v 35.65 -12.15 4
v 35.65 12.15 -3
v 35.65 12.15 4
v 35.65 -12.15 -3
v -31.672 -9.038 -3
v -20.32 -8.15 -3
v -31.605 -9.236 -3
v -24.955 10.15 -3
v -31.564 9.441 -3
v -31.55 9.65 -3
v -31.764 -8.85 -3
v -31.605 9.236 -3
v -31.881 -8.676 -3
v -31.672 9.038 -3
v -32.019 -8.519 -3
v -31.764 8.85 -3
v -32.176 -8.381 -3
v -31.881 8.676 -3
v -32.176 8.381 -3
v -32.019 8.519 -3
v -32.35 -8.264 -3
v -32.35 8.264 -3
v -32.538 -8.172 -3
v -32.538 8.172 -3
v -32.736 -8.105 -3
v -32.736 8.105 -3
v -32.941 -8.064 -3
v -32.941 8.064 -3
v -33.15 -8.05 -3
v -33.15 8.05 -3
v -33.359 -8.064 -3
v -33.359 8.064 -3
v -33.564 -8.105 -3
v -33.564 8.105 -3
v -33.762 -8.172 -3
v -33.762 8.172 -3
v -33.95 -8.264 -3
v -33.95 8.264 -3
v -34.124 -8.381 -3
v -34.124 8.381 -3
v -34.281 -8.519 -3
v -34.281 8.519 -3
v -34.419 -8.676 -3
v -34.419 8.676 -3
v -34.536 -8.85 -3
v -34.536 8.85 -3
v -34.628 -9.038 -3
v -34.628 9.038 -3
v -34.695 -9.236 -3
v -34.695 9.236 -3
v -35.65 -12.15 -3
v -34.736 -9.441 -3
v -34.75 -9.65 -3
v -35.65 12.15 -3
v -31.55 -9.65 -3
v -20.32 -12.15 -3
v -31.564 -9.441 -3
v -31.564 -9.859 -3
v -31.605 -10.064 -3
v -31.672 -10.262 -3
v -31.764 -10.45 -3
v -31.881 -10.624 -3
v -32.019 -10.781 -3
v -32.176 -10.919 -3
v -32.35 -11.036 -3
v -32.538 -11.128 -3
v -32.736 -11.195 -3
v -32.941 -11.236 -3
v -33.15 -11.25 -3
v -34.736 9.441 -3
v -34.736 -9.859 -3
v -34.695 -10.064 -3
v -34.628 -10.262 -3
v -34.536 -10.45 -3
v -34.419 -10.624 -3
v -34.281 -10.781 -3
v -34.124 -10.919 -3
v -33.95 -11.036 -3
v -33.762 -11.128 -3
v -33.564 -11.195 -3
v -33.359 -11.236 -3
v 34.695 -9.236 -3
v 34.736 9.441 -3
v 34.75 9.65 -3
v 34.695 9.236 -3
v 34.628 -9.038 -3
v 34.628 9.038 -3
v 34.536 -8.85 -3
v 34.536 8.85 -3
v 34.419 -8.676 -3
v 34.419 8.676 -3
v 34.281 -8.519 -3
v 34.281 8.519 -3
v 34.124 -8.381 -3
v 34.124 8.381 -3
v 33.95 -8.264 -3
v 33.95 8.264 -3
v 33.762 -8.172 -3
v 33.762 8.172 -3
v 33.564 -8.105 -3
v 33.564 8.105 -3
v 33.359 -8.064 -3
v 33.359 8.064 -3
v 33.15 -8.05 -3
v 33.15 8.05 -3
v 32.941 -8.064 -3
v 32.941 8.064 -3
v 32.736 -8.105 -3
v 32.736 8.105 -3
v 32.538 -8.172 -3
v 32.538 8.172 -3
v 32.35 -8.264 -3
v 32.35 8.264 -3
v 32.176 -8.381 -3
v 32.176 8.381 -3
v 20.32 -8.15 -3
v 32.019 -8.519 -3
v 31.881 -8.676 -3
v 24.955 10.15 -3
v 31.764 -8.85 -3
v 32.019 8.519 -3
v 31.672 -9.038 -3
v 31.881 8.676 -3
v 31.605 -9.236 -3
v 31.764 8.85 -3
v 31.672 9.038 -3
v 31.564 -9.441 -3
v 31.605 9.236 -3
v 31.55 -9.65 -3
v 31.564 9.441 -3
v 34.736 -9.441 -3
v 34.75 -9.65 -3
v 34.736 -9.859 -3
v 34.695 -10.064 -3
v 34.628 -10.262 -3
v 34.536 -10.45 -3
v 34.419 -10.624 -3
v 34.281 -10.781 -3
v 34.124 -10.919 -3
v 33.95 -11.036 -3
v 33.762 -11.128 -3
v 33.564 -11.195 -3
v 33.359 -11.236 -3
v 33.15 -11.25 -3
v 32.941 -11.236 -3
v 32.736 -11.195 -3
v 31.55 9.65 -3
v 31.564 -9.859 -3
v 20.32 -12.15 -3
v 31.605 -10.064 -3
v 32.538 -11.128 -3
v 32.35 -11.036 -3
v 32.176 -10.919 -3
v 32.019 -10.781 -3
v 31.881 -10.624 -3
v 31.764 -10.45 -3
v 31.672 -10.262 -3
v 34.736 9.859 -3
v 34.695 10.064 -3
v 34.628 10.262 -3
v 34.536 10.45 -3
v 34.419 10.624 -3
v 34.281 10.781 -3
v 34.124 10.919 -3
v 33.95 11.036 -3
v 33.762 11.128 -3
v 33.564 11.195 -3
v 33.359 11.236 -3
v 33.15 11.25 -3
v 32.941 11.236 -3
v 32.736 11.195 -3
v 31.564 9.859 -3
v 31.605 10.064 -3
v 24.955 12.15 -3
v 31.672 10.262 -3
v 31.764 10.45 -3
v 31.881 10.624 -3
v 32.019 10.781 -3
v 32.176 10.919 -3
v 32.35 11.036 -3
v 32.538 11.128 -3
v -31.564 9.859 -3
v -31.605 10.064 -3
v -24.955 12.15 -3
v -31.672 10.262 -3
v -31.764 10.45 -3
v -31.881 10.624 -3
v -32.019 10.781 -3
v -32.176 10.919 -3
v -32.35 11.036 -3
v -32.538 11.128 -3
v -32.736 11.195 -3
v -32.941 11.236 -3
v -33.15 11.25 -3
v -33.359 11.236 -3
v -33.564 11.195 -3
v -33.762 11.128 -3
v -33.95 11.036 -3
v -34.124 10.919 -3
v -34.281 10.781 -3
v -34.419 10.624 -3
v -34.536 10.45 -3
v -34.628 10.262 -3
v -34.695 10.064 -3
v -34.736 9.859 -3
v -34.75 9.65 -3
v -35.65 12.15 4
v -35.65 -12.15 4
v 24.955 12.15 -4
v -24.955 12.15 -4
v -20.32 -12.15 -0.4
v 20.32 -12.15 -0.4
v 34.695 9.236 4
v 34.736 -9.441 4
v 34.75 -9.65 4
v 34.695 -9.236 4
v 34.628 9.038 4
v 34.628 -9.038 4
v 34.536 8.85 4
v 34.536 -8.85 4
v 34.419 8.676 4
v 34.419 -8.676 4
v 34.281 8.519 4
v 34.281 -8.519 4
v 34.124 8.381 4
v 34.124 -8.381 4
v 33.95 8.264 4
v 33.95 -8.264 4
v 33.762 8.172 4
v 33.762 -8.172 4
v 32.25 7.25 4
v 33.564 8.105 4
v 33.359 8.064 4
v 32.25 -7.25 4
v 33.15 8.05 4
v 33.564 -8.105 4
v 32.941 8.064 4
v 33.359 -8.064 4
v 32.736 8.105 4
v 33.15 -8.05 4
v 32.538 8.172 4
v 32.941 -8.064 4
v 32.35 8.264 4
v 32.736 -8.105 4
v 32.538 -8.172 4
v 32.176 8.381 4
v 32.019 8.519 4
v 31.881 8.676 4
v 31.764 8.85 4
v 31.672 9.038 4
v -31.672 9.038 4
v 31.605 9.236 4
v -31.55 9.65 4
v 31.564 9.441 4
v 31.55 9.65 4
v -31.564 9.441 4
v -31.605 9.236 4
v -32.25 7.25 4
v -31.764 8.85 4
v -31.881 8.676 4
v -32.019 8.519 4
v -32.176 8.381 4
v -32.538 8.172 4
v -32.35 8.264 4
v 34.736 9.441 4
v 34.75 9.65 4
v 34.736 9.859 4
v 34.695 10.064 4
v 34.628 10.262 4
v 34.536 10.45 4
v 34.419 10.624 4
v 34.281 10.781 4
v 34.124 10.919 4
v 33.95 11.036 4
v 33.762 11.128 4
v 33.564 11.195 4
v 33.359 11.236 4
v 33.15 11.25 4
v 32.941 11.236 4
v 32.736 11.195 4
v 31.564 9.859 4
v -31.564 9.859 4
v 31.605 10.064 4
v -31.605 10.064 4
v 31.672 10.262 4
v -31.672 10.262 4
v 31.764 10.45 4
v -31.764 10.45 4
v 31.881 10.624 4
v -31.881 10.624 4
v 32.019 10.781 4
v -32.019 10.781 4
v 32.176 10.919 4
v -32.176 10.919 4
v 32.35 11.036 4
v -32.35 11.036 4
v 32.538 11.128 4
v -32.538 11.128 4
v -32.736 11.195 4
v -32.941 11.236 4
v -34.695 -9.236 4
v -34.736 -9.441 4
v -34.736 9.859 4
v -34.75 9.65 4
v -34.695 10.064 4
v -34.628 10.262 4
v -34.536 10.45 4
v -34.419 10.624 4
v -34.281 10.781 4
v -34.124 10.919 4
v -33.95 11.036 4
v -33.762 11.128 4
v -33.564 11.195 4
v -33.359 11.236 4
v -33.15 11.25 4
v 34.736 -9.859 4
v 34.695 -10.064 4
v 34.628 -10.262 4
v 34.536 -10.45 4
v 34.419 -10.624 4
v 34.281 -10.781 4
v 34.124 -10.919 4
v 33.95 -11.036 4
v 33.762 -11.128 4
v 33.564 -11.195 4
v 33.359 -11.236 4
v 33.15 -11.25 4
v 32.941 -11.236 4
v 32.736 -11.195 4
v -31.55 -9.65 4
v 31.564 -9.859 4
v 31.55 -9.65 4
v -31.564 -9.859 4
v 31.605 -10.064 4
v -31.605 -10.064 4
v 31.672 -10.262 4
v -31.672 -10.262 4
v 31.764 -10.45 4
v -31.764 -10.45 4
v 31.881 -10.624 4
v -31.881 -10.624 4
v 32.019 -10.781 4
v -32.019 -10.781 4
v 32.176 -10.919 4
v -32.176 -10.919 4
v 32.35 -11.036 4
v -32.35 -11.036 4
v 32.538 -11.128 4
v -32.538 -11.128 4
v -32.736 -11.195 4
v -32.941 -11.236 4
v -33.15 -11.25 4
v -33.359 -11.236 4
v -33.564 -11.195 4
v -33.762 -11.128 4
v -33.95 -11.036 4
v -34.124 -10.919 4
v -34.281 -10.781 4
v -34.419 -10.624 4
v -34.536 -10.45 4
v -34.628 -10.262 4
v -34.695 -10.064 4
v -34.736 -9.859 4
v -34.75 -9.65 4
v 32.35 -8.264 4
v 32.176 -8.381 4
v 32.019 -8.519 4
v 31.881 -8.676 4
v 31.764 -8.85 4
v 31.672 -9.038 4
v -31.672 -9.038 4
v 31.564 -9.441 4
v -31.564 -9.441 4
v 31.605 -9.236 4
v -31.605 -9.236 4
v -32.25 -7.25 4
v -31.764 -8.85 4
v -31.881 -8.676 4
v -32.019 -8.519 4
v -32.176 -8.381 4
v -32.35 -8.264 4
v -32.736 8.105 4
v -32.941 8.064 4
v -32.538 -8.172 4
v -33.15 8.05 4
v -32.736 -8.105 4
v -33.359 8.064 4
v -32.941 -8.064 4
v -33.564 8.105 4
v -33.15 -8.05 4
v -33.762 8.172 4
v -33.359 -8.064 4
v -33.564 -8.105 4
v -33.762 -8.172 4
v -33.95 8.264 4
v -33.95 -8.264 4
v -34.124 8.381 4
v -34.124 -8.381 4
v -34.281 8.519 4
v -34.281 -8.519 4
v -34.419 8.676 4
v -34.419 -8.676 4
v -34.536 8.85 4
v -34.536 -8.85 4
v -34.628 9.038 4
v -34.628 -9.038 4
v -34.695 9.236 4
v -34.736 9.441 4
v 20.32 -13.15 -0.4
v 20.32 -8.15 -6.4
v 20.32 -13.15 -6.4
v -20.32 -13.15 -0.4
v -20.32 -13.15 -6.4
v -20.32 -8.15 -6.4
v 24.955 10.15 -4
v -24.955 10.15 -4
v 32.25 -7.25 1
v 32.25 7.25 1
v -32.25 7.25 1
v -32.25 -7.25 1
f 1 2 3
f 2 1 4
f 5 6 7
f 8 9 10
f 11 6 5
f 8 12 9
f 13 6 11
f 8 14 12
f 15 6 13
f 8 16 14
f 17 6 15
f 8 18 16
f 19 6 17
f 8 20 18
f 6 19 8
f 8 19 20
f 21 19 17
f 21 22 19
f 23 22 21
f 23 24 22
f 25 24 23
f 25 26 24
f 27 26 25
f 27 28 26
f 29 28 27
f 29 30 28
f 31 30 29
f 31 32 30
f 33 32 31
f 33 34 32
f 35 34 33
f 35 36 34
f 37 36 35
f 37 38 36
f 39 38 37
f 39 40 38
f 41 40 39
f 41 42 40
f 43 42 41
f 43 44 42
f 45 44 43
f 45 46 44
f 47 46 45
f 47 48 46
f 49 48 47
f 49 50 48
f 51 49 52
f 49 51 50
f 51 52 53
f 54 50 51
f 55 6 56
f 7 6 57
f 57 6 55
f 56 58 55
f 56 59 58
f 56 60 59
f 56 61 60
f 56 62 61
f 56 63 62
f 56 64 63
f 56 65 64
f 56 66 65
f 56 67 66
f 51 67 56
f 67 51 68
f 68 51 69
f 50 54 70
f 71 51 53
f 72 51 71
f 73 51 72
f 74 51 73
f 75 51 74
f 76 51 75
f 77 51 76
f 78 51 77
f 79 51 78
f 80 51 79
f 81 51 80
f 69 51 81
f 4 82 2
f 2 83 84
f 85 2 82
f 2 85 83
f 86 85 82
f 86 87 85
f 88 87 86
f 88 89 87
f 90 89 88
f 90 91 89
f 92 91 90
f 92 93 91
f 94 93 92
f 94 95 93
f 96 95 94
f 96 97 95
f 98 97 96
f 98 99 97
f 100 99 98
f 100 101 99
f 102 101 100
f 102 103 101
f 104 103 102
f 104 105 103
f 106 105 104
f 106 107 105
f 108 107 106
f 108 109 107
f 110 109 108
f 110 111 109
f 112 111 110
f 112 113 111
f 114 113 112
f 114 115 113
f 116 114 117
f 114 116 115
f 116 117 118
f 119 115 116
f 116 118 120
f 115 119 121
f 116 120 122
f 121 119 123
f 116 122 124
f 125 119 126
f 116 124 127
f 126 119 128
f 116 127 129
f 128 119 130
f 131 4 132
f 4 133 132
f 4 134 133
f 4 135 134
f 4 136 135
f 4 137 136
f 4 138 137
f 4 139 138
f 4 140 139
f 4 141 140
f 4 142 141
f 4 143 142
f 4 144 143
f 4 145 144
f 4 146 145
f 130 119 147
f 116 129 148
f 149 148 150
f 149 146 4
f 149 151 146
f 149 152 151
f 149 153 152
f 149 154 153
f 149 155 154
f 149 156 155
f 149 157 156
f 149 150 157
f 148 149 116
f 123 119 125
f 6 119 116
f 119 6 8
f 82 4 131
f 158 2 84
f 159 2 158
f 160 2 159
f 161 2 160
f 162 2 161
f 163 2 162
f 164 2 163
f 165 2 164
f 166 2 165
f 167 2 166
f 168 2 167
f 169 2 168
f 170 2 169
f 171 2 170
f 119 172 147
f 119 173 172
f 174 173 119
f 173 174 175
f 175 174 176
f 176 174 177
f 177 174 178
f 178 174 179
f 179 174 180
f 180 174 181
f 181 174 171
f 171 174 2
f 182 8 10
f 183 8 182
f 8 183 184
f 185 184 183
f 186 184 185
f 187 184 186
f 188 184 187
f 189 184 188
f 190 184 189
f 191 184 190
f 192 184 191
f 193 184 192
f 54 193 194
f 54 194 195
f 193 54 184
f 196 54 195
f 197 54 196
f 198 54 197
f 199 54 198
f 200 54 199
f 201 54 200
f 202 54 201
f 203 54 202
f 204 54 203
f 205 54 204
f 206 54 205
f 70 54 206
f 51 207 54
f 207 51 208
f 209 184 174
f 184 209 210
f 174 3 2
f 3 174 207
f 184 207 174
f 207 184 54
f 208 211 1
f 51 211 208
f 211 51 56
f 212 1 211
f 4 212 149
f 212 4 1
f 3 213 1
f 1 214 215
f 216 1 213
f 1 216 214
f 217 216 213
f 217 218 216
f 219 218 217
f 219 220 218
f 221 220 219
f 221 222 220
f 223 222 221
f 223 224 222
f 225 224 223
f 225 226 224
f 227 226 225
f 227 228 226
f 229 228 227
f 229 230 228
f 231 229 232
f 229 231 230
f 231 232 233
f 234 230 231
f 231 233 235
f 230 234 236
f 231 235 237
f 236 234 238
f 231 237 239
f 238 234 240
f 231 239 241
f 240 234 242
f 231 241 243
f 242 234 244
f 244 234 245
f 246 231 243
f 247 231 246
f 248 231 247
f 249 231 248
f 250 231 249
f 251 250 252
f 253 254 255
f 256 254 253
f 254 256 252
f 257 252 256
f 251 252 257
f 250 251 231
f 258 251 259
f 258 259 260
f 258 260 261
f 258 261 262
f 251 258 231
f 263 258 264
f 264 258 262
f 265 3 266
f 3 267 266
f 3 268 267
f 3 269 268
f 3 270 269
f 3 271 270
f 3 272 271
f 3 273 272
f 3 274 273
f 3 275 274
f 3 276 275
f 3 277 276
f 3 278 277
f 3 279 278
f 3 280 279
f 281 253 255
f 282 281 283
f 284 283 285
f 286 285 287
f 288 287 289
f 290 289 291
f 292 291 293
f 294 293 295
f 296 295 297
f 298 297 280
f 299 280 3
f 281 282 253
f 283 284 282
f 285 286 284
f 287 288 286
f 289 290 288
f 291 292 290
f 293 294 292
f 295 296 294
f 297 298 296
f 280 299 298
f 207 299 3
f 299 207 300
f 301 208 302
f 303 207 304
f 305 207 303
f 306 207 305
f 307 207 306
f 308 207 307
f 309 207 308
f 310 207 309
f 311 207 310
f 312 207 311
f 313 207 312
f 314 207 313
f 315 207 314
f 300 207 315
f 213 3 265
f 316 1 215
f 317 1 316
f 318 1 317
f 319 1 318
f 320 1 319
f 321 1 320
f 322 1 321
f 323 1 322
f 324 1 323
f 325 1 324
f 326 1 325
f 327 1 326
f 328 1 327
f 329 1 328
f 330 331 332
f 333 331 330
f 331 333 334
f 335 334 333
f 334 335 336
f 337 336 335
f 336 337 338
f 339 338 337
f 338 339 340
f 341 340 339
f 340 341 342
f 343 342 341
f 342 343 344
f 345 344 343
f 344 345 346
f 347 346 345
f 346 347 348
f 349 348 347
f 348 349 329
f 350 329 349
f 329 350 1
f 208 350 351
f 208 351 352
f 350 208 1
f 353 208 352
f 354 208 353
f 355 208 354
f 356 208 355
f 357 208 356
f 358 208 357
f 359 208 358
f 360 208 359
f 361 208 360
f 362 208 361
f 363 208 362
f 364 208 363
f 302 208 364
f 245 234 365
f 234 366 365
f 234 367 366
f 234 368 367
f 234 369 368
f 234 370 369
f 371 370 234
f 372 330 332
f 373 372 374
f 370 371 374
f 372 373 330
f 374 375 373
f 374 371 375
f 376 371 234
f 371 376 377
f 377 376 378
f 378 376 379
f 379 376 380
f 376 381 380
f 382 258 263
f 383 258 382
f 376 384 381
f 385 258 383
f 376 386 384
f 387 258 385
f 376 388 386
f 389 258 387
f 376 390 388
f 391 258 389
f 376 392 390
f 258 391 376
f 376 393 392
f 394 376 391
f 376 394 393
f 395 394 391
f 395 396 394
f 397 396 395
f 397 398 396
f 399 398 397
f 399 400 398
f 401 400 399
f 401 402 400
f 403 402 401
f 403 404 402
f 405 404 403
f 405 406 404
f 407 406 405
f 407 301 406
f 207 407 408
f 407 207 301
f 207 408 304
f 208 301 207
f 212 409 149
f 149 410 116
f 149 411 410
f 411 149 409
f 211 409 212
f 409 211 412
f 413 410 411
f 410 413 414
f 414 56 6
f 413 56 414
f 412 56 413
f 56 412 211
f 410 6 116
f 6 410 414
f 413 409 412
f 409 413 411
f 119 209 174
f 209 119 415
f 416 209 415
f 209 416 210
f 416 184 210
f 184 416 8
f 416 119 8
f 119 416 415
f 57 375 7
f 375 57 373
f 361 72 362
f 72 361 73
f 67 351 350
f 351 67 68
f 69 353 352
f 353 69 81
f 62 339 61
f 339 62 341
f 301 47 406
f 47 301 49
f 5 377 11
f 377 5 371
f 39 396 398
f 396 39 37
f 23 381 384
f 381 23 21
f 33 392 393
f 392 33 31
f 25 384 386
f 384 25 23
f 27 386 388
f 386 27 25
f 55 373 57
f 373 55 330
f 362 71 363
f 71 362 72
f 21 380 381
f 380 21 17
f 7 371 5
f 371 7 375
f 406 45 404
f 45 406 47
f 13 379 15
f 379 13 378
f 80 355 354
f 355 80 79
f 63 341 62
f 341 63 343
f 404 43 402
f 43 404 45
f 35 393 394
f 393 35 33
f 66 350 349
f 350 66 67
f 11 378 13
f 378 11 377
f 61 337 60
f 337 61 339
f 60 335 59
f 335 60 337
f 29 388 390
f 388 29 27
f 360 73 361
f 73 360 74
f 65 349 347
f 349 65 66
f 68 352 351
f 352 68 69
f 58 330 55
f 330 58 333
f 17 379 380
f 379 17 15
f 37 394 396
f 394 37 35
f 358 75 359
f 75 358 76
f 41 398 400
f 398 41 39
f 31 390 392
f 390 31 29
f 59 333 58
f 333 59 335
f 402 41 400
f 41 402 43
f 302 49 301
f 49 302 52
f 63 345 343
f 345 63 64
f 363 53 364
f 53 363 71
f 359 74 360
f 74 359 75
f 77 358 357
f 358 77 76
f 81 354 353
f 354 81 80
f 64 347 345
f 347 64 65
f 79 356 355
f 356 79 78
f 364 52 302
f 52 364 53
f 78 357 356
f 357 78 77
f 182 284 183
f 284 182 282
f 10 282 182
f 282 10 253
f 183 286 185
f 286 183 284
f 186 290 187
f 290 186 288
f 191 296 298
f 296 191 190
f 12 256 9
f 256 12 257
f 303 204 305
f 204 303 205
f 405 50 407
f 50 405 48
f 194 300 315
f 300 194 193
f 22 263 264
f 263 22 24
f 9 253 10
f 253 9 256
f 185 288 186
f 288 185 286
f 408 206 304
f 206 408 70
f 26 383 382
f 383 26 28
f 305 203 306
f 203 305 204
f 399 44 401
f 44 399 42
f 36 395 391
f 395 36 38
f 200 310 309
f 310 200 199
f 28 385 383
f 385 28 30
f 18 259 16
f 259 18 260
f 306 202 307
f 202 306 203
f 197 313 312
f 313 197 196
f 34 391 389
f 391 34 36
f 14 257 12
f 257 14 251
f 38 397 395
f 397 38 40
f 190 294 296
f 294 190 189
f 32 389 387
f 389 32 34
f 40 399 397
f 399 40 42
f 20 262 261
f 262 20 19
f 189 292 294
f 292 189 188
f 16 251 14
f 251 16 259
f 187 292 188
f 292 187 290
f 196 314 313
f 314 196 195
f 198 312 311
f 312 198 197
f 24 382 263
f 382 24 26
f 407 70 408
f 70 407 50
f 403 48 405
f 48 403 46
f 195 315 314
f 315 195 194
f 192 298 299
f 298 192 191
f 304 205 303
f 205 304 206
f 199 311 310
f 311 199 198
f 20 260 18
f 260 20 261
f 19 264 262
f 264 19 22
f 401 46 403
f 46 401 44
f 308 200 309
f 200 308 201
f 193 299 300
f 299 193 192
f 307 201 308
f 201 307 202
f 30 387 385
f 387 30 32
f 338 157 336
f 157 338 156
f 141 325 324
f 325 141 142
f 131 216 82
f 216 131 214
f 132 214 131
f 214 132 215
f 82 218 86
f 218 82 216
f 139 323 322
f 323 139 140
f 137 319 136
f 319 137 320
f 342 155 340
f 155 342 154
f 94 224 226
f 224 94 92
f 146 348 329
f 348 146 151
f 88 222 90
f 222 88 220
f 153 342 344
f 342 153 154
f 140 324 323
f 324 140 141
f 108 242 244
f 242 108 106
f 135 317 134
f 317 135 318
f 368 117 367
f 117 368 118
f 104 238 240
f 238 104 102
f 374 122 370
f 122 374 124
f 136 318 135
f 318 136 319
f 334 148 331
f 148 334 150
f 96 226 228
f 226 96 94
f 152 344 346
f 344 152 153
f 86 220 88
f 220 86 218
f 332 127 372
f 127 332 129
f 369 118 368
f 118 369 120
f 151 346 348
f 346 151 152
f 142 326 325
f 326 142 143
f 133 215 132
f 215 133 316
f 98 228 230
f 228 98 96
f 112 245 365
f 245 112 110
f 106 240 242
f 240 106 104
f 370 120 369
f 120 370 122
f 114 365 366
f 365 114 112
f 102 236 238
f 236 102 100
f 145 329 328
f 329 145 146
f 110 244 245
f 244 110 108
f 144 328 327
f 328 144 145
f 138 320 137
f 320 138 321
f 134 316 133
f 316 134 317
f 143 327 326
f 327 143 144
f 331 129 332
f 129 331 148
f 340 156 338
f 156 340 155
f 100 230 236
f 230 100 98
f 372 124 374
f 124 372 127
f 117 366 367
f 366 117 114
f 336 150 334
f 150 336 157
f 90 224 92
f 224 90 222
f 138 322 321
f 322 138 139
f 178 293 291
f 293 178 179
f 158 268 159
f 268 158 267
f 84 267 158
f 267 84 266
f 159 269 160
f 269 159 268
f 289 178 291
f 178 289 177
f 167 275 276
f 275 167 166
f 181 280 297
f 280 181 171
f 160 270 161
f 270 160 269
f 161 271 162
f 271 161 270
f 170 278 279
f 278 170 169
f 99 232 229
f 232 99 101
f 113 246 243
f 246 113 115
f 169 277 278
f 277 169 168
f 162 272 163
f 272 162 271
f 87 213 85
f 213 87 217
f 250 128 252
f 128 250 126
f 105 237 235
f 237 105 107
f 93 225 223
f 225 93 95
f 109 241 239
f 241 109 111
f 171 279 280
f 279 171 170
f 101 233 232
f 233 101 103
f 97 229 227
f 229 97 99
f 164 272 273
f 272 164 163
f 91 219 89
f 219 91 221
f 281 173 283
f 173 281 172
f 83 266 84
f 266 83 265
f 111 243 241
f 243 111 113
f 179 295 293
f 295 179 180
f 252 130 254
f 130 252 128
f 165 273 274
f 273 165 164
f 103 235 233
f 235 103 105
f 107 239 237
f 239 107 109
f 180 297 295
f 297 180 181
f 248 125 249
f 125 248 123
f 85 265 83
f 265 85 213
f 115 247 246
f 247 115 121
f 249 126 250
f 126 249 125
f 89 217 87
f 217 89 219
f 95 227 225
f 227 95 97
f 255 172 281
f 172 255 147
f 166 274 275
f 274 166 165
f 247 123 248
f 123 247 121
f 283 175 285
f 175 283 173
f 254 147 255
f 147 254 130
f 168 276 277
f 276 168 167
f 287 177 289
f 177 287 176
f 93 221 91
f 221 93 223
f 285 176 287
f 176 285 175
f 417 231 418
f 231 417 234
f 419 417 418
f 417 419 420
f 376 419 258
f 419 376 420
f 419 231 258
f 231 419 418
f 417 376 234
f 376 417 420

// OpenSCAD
$fn = 48;

// Parameters
overall_width_mm = 71.3; //[35.65:142.6:0.1]
overall_height_mm = 24.3; //[12.15:48.6:0.1]
thickness_mm = 8; //[4:16:0.1]

pcb_thickness_mm = 1.6; //[0.8:3.2:0.1]
bezel_thickness_mm = 6.4; //[3.2:12.8:0.1]

aperture_width_mm = 64.5; //[32.25:129:0.1]
aperture_height_mm = 14.5; //[7.25:29:0.1]
aperture_depth_mm = 2; //[0.5:6:0.1]

mount_hole_diameter_mm = 3.2; //[1.6:6.4:0.1]
mount_hole_edge_margin_x_mm = 2.5; //[1.25:5:0.1]
mount_hole_edge_margin_y_mm = 2.5; //[1.25:5:0.1]

connector_pitch_mm = 2.54; //[1.27:5.08:0.01]
connector_pins = 16; //[8:20:1]
connector_body_depth_mm = 5; //[2.5:10:0.1]
connector_body_height_mm = 6; //[3:12:0.1]
connector_overhang_mm = 1; //[0.5:3:0.1]

overlap_mm = 1; //[0.5:2:0.1]

// Derived
pcb_zc   = -(thickness_mm/2) + (pcb_thickness_mm/2);
bezel_zc = -(thickness_mm/2) + pcb_thickness_mm + (bezel_thickness_mm/2) - overlap_mm;

// Keep the overall thickness exactly thickness_mm
bezel_top_z = bezel_zc + bezel_thickness_mm/2;
z_shift = (thickness_mm/2) - bezel_top_z;

// Final Z centers after shift
pcb_zc_s   = pcb_zc + z_shift;
bezel_zc_s = bezel_zc + z_shift;

// Aperture: cut into bezel from the front (top) face
aperture_zc_s = (thickness_mm/2) - (aperture_depth_mm/2);

// Connector: on back side, attached to PCB (not floating)
conn_w = connector_pins * connector_pitch_mm;
conn_yc = -(overall_height_mm/2) + (connector_body_depth_mm/2) - connector_overhang_mm;
conn_zc_s = (pcb_zc_s + pcb_thickness_mm/2) - (connector_body_height_mm/2) + overlap_mm;

// Mount holes positions
hole_x = overall_width_mm/2 - mount_hole_edge_margin_x_mm;
hole_y = overall_height_mm/2 - mount_hole_edge_margin_y_mm;

// Geometry (single connected solid)
module lcd1602a_module() {
  difference() {
    union() {
      // PCB
      translate([0, 0, pcb_zc_s])
        cube([overall_width_mm, overall_height_mm, pcb_thickness_mm], center=true);

      // Bezel (front)
      translate([0, 0, bezel_zc_s])
        cube([overall_width_mm, overall_height_mm, bezel_thickness_mm], center=true);

      // Back-side connector body (attached to PCB)
      translate([0, conn_yc, conn_zc_s])
        cube([conn_w, connector_body_depth_mm, connector_body_height_mm], center=true);

      // Small back-side stiffener/feature bar (typical PCB feature), attached to PCB
      // (kept subtle; ensures visible back detail without changing overall footprint)
      feature_w = overall_width_mm * 0.70;
      feature_d = 2.0;
      feature_h = 1.2;
      feature_yc = (overall_height_mm/2) - feature_d/2;
      feature_zc_s = (pcb_zc_s - pcb_thickness_mm/2) + feature_h/2 - overlap_mm;
      translate([0, feature_yc, feature_zc_s])
        cube([feature_w, feature_d, feature_h], center=true);
    }

    // Display aperture recess (cut into bezel only; does not remove entire model)
    translate([0, 0, aperture_zc_s])
      cube([aperture_width_mm, aperture_height_mm, aperture_depth_mm + 2*overlap_mm], center=true);

    // Mounting holes through entire thickness
    for (sx = [-1, 1])
      for (sy = [-1, 1])
        translate([sx*hole_x, sy*hole_y, 0])
          cylinder(d=mount_hole_diameter_mm, h=thickness_mm + 2*overlap_mm, center=true);
  }
}

lcd1602a_module();
